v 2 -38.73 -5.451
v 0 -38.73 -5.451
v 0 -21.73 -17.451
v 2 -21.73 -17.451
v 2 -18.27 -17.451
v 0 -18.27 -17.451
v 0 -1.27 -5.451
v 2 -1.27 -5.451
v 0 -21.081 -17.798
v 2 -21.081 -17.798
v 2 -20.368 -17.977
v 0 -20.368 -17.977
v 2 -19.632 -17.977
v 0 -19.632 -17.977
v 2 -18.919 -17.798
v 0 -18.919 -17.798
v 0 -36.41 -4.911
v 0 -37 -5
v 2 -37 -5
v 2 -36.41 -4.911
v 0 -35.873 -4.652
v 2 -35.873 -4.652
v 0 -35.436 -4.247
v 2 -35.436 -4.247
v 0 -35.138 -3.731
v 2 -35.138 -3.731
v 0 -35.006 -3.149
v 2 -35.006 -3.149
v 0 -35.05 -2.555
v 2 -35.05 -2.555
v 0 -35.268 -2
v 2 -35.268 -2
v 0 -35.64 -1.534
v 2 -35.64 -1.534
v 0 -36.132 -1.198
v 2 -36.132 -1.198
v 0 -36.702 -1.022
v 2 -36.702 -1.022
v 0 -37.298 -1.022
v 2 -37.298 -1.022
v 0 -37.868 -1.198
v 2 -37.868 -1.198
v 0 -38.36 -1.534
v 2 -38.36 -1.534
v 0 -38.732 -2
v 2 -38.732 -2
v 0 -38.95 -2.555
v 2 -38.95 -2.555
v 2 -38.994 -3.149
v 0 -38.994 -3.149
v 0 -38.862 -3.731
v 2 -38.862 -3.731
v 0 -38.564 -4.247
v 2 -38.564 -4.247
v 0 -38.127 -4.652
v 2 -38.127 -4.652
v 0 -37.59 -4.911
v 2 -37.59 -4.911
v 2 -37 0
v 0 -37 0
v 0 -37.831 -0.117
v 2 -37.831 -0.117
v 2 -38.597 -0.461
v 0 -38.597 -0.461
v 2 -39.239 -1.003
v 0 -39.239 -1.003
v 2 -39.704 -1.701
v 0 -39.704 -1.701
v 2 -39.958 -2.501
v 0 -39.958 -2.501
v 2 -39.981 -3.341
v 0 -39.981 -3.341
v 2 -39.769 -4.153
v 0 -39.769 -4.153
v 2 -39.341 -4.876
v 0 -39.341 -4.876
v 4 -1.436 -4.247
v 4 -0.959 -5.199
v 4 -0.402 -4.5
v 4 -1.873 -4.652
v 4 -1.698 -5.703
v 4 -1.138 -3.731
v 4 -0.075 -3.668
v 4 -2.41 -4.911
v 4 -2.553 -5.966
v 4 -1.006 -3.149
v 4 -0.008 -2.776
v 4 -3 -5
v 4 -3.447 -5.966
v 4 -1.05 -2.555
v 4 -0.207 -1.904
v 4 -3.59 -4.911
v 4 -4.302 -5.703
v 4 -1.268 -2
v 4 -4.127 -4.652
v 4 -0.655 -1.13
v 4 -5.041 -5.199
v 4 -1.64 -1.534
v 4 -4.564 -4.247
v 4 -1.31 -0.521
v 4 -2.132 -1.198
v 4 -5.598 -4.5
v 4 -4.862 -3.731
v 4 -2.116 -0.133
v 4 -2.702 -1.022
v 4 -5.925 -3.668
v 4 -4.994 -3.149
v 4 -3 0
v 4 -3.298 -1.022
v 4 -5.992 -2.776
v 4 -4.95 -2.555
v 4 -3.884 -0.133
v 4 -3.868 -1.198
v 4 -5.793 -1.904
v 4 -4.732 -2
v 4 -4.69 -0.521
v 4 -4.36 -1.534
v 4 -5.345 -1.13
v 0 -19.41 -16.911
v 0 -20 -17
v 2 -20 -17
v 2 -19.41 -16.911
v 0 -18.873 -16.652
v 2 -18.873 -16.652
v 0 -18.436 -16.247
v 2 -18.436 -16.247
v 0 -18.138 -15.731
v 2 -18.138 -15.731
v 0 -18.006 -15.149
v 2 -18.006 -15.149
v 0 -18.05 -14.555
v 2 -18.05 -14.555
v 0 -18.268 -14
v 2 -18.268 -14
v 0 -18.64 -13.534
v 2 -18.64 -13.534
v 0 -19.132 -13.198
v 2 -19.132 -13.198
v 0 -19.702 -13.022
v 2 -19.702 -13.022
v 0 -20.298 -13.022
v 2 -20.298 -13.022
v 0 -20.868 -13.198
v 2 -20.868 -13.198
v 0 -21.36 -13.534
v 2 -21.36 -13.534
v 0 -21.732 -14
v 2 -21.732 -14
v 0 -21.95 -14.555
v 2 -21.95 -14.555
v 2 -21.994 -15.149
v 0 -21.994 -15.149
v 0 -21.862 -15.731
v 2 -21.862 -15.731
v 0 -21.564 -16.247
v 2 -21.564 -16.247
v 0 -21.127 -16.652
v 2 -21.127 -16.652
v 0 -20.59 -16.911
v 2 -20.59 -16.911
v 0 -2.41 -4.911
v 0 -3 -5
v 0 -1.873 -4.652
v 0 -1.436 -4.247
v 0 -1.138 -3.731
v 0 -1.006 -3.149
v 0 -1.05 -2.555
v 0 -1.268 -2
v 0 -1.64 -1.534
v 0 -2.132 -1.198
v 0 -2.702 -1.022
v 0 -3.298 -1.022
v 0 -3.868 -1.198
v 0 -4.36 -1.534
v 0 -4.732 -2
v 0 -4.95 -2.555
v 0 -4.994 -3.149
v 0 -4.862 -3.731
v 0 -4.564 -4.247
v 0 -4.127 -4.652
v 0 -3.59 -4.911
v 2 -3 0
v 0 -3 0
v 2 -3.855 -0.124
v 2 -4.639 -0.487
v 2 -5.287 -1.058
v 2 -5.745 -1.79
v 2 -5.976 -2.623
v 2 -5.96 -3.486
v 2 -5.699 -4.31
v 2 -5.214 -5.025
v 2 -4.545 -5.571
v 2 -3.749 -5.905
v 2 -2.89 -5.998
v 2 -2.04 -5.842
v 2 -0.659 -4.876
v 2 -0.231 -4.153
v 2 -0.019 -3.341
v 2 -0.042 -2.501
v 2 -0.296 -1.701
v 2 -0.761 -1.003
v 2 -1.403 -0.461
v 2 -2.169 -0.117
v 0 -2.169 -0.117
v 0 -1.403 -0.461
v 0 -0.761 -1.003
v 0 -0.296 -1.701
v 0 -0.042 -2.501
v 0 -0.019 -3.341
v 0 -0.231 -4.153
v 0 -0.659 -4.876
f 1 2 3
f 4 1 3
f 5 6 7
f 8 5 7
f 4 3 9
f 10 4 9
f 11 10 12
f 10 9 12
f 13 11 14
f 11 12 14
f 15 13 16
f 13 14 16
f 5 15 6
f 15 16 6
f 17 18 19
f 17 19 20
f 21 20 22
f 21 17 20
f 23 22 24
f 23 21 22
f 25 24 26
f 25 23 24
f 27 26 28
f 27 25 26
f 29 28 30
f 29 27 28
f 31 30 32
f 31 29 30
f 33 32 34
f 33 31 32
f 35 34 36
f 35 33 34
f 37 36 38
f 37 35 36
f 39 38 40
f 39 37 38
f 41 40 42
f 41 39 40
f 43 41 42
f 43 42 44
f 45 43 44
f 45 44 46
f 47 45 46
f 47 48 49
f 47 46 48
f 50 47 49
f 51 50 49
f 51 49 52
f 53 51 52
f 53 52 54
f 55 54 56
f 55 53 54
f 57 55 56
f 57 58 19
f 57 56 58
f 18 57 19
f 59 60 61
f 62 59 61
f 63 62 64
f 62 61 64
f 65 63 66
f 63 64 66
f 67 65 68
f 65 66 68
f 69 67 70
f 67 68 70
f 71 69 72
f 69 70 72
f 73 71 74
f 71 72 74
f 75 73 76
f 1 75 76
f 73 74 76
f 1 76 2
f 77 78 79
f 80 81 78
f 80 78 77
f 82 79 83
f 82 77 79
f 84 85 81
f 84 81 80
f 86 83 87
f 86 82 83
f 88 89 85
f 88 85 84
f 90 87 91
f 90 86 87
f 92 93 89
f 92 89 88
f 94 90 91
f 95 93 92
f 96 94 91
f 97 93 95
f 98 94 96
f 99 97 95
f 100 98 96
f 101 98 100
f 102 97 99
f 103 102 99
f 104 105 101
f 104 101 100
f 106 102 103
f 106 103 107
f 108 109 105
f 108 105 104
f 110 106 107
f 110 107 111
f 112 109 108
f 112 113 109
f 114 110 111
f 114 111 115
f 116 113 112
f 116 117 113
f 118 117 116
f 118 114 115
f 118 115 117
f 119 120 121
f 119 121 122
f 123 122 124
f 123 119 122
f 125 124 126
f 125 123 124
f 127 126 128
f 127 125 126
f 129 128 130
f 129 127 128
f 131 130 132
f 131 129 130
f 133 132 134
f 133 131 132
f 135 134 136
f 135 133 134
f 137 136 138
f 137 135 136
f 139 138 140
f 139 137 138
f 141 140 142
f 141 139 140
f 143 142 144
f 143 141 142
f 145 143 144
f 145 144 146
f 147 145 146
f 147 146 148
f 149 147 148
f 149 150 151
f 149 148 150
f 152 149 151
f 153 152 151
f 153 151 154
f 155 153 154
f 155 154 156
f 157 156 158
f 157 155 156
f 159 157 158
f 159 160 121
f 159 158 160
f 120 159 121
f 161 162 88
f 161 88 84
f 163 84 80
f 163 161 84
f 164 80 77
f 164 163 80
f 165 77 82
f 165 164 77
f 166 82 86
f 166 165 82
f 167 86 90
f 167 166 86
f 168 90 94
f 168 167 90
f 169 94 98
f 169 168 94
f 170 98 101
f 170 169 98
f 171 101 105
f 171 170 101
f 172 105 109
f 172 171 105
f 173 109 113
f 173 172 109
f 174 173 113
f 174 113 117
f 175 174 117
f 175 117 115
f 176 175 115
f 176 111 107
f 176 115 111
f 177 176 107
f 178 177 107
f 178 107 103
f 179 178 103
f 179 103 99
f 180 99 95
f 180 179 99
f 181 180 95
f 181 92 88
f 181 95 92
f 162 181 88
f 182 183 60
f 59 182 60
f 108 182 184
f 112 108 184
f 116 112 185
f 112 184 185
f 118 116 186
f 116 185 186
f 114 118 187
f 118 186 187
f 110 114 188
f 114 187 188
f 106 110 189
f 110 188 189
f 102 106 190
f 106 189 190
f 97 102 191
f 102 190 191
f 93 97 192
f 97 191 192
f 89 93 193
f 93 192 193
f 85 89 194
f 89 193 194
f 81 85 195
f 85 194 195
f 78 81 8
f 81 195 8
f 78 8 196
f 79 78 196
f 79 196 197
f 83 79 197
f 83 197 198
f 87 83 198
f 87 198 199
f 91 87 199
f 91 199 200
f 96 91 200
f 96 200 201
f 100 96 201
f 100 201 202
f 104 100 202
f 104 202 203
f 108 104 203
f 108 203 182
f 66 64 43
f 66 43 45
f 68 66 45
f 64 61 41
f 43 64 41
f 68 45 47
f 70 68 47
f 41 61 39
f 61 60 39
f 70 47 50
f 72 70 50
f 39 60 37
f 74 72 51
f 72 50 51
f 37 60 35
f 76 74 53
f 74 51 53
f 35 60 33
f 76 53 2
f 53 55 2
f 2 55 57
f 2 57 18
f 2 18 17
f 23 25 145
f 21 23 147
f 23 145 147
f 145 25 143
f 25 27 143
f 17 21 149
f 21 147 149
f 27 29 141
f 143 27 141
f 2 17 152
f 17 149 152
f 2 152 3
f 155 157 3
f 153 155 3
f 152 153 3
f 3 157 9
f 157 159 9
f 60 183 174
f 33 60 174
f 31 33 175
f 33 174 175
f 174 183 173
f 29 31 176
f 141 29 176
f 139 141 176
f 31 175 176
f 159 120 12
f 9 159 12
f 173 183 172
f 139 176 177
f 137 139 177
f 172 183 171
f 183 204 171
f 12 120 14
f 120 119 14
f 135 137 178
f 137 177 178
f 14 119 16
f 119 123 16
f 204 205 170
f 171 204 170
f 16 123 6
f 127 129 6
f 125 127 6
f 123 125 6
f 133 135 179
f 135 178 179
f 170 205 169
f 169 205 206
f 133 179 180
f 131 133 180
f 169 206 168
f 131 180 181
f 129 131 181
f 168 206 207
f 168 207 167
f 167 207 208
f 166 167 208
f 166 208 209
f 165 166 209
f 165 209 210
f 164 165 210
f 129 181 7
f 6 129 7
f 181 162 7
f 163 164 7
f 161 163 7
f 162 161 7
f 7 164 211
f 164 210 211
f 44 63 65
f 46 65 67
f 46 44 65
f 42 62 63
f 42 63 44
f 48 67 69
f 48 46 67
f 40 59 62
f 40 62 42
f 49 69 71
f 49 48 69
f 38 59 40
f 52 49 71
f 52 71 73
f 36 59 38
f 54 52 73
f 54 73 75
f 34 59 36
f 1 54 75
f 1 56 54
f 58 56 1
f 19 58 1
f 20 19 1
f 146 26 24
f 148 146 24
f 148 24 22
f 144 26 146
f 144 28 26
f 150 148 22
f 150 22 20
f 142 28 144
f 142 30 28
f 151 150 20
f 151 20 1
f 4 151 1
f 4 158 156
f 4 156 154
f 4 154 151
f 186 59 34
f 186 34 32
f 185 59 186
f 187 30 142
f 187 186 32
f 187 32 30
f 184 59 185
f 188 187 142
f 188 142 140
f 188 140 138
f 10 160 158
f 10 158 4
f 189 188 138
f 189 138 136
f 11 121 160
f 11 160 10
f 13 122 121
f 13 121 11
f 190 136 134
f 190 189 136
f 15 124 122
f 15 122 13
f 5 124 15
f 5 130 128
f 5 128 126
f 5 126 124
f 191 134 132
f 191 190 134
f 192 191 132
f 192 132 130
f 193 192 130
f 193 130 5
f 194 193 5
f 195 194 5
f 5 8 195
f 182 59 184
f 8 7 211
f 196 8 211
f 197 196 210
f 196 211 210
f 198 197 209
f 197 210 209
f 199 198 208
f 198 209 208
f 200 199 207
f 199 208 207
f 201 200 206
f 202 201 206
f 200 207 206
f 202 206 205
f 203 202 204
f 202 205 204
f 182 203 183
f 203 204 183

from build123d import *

# Parameters (mm, degrees)
EXTRUDE_1_DEPTH          = 2
EXTRUDE_START            = 2
SKETCH_1_4_R             = 3
EXTRUDE_2_DEPTH          = 2
CUT_EXTRUDE_1_DEPTH      = 45.045431091
CUT_EXTRUDE_1_DEPTH_BACK = 45.045431091
SKETCH_1_3_R             = 2


with BuildPart() as part:
    # 草图1 → 凸台-拉伸1 (new body)
    with BuildSketch(Plane(origin=(0, 0, 0), x_dir=(0, 0, -1), z_dir=(1, 0, 0))):
        with BuildLine():
            Line((17.45090359, -18.269950407), (5.45090359, -1.269950407))
            ThreePointArc((5.45090359, -1.269950407), (2.092451315, -0.140567297), (0, -3))
            Line((0, -3), (0, -37))
            ThreePointArc((0, -37), (2.092451315, -39.859432703), (5.45090359, -38.730049593))
            Line((5.45090359, -38.730049593), (17.45090359, -21.730049593))
            ThreePointArc((17.45090359, -21.730049593), (18, -20), (17.45090359, -18.269950407))
        make_face()
    extrude(amount=EXTRUDE_1_DEPTH)

    # 草图1<4> → 凸台-拉伸2 (add)
    with BuildSketch(Plane(origin=(0, 0, 0), x_dir=(0, 0, -1), z_dir=(1, 0, 0)).offset(EXTRUDE_START)):
        with Locations(Location((3, -3, 0), (0, 0, 180))):
            Circle(SKETCH_1_4_R)
    extrude(amount=EXTRUDE_2_DEPTH)

    # 草图1<3> → 切除-拉伸1 (cut, two sides: drawn at the far end of the back side and taken through both)
    with BuildSketch(Plane(origin=(0, 0, 0), x_dir=(0, 0, -1), z_dir=(1, 0, 0)).offset(-CUT_EXTRUDE_1_DEPTH_BACK)):
        with Locations((3, -3)):
            Circle(SKETCH_1_3_R)
        with Locations((15, -20)):
            Circle(SKETCH_1_3_R)
        with Locations((3, -37)):
            Circle(SKETCH_1_3_R)
    extrude(amount=CUT_EXTRUDE_1_DEPTH + CUT_EXTRUDE_1_DEPTH_BACK, mode=Mode.SUBTRACT)


solid = part.part
